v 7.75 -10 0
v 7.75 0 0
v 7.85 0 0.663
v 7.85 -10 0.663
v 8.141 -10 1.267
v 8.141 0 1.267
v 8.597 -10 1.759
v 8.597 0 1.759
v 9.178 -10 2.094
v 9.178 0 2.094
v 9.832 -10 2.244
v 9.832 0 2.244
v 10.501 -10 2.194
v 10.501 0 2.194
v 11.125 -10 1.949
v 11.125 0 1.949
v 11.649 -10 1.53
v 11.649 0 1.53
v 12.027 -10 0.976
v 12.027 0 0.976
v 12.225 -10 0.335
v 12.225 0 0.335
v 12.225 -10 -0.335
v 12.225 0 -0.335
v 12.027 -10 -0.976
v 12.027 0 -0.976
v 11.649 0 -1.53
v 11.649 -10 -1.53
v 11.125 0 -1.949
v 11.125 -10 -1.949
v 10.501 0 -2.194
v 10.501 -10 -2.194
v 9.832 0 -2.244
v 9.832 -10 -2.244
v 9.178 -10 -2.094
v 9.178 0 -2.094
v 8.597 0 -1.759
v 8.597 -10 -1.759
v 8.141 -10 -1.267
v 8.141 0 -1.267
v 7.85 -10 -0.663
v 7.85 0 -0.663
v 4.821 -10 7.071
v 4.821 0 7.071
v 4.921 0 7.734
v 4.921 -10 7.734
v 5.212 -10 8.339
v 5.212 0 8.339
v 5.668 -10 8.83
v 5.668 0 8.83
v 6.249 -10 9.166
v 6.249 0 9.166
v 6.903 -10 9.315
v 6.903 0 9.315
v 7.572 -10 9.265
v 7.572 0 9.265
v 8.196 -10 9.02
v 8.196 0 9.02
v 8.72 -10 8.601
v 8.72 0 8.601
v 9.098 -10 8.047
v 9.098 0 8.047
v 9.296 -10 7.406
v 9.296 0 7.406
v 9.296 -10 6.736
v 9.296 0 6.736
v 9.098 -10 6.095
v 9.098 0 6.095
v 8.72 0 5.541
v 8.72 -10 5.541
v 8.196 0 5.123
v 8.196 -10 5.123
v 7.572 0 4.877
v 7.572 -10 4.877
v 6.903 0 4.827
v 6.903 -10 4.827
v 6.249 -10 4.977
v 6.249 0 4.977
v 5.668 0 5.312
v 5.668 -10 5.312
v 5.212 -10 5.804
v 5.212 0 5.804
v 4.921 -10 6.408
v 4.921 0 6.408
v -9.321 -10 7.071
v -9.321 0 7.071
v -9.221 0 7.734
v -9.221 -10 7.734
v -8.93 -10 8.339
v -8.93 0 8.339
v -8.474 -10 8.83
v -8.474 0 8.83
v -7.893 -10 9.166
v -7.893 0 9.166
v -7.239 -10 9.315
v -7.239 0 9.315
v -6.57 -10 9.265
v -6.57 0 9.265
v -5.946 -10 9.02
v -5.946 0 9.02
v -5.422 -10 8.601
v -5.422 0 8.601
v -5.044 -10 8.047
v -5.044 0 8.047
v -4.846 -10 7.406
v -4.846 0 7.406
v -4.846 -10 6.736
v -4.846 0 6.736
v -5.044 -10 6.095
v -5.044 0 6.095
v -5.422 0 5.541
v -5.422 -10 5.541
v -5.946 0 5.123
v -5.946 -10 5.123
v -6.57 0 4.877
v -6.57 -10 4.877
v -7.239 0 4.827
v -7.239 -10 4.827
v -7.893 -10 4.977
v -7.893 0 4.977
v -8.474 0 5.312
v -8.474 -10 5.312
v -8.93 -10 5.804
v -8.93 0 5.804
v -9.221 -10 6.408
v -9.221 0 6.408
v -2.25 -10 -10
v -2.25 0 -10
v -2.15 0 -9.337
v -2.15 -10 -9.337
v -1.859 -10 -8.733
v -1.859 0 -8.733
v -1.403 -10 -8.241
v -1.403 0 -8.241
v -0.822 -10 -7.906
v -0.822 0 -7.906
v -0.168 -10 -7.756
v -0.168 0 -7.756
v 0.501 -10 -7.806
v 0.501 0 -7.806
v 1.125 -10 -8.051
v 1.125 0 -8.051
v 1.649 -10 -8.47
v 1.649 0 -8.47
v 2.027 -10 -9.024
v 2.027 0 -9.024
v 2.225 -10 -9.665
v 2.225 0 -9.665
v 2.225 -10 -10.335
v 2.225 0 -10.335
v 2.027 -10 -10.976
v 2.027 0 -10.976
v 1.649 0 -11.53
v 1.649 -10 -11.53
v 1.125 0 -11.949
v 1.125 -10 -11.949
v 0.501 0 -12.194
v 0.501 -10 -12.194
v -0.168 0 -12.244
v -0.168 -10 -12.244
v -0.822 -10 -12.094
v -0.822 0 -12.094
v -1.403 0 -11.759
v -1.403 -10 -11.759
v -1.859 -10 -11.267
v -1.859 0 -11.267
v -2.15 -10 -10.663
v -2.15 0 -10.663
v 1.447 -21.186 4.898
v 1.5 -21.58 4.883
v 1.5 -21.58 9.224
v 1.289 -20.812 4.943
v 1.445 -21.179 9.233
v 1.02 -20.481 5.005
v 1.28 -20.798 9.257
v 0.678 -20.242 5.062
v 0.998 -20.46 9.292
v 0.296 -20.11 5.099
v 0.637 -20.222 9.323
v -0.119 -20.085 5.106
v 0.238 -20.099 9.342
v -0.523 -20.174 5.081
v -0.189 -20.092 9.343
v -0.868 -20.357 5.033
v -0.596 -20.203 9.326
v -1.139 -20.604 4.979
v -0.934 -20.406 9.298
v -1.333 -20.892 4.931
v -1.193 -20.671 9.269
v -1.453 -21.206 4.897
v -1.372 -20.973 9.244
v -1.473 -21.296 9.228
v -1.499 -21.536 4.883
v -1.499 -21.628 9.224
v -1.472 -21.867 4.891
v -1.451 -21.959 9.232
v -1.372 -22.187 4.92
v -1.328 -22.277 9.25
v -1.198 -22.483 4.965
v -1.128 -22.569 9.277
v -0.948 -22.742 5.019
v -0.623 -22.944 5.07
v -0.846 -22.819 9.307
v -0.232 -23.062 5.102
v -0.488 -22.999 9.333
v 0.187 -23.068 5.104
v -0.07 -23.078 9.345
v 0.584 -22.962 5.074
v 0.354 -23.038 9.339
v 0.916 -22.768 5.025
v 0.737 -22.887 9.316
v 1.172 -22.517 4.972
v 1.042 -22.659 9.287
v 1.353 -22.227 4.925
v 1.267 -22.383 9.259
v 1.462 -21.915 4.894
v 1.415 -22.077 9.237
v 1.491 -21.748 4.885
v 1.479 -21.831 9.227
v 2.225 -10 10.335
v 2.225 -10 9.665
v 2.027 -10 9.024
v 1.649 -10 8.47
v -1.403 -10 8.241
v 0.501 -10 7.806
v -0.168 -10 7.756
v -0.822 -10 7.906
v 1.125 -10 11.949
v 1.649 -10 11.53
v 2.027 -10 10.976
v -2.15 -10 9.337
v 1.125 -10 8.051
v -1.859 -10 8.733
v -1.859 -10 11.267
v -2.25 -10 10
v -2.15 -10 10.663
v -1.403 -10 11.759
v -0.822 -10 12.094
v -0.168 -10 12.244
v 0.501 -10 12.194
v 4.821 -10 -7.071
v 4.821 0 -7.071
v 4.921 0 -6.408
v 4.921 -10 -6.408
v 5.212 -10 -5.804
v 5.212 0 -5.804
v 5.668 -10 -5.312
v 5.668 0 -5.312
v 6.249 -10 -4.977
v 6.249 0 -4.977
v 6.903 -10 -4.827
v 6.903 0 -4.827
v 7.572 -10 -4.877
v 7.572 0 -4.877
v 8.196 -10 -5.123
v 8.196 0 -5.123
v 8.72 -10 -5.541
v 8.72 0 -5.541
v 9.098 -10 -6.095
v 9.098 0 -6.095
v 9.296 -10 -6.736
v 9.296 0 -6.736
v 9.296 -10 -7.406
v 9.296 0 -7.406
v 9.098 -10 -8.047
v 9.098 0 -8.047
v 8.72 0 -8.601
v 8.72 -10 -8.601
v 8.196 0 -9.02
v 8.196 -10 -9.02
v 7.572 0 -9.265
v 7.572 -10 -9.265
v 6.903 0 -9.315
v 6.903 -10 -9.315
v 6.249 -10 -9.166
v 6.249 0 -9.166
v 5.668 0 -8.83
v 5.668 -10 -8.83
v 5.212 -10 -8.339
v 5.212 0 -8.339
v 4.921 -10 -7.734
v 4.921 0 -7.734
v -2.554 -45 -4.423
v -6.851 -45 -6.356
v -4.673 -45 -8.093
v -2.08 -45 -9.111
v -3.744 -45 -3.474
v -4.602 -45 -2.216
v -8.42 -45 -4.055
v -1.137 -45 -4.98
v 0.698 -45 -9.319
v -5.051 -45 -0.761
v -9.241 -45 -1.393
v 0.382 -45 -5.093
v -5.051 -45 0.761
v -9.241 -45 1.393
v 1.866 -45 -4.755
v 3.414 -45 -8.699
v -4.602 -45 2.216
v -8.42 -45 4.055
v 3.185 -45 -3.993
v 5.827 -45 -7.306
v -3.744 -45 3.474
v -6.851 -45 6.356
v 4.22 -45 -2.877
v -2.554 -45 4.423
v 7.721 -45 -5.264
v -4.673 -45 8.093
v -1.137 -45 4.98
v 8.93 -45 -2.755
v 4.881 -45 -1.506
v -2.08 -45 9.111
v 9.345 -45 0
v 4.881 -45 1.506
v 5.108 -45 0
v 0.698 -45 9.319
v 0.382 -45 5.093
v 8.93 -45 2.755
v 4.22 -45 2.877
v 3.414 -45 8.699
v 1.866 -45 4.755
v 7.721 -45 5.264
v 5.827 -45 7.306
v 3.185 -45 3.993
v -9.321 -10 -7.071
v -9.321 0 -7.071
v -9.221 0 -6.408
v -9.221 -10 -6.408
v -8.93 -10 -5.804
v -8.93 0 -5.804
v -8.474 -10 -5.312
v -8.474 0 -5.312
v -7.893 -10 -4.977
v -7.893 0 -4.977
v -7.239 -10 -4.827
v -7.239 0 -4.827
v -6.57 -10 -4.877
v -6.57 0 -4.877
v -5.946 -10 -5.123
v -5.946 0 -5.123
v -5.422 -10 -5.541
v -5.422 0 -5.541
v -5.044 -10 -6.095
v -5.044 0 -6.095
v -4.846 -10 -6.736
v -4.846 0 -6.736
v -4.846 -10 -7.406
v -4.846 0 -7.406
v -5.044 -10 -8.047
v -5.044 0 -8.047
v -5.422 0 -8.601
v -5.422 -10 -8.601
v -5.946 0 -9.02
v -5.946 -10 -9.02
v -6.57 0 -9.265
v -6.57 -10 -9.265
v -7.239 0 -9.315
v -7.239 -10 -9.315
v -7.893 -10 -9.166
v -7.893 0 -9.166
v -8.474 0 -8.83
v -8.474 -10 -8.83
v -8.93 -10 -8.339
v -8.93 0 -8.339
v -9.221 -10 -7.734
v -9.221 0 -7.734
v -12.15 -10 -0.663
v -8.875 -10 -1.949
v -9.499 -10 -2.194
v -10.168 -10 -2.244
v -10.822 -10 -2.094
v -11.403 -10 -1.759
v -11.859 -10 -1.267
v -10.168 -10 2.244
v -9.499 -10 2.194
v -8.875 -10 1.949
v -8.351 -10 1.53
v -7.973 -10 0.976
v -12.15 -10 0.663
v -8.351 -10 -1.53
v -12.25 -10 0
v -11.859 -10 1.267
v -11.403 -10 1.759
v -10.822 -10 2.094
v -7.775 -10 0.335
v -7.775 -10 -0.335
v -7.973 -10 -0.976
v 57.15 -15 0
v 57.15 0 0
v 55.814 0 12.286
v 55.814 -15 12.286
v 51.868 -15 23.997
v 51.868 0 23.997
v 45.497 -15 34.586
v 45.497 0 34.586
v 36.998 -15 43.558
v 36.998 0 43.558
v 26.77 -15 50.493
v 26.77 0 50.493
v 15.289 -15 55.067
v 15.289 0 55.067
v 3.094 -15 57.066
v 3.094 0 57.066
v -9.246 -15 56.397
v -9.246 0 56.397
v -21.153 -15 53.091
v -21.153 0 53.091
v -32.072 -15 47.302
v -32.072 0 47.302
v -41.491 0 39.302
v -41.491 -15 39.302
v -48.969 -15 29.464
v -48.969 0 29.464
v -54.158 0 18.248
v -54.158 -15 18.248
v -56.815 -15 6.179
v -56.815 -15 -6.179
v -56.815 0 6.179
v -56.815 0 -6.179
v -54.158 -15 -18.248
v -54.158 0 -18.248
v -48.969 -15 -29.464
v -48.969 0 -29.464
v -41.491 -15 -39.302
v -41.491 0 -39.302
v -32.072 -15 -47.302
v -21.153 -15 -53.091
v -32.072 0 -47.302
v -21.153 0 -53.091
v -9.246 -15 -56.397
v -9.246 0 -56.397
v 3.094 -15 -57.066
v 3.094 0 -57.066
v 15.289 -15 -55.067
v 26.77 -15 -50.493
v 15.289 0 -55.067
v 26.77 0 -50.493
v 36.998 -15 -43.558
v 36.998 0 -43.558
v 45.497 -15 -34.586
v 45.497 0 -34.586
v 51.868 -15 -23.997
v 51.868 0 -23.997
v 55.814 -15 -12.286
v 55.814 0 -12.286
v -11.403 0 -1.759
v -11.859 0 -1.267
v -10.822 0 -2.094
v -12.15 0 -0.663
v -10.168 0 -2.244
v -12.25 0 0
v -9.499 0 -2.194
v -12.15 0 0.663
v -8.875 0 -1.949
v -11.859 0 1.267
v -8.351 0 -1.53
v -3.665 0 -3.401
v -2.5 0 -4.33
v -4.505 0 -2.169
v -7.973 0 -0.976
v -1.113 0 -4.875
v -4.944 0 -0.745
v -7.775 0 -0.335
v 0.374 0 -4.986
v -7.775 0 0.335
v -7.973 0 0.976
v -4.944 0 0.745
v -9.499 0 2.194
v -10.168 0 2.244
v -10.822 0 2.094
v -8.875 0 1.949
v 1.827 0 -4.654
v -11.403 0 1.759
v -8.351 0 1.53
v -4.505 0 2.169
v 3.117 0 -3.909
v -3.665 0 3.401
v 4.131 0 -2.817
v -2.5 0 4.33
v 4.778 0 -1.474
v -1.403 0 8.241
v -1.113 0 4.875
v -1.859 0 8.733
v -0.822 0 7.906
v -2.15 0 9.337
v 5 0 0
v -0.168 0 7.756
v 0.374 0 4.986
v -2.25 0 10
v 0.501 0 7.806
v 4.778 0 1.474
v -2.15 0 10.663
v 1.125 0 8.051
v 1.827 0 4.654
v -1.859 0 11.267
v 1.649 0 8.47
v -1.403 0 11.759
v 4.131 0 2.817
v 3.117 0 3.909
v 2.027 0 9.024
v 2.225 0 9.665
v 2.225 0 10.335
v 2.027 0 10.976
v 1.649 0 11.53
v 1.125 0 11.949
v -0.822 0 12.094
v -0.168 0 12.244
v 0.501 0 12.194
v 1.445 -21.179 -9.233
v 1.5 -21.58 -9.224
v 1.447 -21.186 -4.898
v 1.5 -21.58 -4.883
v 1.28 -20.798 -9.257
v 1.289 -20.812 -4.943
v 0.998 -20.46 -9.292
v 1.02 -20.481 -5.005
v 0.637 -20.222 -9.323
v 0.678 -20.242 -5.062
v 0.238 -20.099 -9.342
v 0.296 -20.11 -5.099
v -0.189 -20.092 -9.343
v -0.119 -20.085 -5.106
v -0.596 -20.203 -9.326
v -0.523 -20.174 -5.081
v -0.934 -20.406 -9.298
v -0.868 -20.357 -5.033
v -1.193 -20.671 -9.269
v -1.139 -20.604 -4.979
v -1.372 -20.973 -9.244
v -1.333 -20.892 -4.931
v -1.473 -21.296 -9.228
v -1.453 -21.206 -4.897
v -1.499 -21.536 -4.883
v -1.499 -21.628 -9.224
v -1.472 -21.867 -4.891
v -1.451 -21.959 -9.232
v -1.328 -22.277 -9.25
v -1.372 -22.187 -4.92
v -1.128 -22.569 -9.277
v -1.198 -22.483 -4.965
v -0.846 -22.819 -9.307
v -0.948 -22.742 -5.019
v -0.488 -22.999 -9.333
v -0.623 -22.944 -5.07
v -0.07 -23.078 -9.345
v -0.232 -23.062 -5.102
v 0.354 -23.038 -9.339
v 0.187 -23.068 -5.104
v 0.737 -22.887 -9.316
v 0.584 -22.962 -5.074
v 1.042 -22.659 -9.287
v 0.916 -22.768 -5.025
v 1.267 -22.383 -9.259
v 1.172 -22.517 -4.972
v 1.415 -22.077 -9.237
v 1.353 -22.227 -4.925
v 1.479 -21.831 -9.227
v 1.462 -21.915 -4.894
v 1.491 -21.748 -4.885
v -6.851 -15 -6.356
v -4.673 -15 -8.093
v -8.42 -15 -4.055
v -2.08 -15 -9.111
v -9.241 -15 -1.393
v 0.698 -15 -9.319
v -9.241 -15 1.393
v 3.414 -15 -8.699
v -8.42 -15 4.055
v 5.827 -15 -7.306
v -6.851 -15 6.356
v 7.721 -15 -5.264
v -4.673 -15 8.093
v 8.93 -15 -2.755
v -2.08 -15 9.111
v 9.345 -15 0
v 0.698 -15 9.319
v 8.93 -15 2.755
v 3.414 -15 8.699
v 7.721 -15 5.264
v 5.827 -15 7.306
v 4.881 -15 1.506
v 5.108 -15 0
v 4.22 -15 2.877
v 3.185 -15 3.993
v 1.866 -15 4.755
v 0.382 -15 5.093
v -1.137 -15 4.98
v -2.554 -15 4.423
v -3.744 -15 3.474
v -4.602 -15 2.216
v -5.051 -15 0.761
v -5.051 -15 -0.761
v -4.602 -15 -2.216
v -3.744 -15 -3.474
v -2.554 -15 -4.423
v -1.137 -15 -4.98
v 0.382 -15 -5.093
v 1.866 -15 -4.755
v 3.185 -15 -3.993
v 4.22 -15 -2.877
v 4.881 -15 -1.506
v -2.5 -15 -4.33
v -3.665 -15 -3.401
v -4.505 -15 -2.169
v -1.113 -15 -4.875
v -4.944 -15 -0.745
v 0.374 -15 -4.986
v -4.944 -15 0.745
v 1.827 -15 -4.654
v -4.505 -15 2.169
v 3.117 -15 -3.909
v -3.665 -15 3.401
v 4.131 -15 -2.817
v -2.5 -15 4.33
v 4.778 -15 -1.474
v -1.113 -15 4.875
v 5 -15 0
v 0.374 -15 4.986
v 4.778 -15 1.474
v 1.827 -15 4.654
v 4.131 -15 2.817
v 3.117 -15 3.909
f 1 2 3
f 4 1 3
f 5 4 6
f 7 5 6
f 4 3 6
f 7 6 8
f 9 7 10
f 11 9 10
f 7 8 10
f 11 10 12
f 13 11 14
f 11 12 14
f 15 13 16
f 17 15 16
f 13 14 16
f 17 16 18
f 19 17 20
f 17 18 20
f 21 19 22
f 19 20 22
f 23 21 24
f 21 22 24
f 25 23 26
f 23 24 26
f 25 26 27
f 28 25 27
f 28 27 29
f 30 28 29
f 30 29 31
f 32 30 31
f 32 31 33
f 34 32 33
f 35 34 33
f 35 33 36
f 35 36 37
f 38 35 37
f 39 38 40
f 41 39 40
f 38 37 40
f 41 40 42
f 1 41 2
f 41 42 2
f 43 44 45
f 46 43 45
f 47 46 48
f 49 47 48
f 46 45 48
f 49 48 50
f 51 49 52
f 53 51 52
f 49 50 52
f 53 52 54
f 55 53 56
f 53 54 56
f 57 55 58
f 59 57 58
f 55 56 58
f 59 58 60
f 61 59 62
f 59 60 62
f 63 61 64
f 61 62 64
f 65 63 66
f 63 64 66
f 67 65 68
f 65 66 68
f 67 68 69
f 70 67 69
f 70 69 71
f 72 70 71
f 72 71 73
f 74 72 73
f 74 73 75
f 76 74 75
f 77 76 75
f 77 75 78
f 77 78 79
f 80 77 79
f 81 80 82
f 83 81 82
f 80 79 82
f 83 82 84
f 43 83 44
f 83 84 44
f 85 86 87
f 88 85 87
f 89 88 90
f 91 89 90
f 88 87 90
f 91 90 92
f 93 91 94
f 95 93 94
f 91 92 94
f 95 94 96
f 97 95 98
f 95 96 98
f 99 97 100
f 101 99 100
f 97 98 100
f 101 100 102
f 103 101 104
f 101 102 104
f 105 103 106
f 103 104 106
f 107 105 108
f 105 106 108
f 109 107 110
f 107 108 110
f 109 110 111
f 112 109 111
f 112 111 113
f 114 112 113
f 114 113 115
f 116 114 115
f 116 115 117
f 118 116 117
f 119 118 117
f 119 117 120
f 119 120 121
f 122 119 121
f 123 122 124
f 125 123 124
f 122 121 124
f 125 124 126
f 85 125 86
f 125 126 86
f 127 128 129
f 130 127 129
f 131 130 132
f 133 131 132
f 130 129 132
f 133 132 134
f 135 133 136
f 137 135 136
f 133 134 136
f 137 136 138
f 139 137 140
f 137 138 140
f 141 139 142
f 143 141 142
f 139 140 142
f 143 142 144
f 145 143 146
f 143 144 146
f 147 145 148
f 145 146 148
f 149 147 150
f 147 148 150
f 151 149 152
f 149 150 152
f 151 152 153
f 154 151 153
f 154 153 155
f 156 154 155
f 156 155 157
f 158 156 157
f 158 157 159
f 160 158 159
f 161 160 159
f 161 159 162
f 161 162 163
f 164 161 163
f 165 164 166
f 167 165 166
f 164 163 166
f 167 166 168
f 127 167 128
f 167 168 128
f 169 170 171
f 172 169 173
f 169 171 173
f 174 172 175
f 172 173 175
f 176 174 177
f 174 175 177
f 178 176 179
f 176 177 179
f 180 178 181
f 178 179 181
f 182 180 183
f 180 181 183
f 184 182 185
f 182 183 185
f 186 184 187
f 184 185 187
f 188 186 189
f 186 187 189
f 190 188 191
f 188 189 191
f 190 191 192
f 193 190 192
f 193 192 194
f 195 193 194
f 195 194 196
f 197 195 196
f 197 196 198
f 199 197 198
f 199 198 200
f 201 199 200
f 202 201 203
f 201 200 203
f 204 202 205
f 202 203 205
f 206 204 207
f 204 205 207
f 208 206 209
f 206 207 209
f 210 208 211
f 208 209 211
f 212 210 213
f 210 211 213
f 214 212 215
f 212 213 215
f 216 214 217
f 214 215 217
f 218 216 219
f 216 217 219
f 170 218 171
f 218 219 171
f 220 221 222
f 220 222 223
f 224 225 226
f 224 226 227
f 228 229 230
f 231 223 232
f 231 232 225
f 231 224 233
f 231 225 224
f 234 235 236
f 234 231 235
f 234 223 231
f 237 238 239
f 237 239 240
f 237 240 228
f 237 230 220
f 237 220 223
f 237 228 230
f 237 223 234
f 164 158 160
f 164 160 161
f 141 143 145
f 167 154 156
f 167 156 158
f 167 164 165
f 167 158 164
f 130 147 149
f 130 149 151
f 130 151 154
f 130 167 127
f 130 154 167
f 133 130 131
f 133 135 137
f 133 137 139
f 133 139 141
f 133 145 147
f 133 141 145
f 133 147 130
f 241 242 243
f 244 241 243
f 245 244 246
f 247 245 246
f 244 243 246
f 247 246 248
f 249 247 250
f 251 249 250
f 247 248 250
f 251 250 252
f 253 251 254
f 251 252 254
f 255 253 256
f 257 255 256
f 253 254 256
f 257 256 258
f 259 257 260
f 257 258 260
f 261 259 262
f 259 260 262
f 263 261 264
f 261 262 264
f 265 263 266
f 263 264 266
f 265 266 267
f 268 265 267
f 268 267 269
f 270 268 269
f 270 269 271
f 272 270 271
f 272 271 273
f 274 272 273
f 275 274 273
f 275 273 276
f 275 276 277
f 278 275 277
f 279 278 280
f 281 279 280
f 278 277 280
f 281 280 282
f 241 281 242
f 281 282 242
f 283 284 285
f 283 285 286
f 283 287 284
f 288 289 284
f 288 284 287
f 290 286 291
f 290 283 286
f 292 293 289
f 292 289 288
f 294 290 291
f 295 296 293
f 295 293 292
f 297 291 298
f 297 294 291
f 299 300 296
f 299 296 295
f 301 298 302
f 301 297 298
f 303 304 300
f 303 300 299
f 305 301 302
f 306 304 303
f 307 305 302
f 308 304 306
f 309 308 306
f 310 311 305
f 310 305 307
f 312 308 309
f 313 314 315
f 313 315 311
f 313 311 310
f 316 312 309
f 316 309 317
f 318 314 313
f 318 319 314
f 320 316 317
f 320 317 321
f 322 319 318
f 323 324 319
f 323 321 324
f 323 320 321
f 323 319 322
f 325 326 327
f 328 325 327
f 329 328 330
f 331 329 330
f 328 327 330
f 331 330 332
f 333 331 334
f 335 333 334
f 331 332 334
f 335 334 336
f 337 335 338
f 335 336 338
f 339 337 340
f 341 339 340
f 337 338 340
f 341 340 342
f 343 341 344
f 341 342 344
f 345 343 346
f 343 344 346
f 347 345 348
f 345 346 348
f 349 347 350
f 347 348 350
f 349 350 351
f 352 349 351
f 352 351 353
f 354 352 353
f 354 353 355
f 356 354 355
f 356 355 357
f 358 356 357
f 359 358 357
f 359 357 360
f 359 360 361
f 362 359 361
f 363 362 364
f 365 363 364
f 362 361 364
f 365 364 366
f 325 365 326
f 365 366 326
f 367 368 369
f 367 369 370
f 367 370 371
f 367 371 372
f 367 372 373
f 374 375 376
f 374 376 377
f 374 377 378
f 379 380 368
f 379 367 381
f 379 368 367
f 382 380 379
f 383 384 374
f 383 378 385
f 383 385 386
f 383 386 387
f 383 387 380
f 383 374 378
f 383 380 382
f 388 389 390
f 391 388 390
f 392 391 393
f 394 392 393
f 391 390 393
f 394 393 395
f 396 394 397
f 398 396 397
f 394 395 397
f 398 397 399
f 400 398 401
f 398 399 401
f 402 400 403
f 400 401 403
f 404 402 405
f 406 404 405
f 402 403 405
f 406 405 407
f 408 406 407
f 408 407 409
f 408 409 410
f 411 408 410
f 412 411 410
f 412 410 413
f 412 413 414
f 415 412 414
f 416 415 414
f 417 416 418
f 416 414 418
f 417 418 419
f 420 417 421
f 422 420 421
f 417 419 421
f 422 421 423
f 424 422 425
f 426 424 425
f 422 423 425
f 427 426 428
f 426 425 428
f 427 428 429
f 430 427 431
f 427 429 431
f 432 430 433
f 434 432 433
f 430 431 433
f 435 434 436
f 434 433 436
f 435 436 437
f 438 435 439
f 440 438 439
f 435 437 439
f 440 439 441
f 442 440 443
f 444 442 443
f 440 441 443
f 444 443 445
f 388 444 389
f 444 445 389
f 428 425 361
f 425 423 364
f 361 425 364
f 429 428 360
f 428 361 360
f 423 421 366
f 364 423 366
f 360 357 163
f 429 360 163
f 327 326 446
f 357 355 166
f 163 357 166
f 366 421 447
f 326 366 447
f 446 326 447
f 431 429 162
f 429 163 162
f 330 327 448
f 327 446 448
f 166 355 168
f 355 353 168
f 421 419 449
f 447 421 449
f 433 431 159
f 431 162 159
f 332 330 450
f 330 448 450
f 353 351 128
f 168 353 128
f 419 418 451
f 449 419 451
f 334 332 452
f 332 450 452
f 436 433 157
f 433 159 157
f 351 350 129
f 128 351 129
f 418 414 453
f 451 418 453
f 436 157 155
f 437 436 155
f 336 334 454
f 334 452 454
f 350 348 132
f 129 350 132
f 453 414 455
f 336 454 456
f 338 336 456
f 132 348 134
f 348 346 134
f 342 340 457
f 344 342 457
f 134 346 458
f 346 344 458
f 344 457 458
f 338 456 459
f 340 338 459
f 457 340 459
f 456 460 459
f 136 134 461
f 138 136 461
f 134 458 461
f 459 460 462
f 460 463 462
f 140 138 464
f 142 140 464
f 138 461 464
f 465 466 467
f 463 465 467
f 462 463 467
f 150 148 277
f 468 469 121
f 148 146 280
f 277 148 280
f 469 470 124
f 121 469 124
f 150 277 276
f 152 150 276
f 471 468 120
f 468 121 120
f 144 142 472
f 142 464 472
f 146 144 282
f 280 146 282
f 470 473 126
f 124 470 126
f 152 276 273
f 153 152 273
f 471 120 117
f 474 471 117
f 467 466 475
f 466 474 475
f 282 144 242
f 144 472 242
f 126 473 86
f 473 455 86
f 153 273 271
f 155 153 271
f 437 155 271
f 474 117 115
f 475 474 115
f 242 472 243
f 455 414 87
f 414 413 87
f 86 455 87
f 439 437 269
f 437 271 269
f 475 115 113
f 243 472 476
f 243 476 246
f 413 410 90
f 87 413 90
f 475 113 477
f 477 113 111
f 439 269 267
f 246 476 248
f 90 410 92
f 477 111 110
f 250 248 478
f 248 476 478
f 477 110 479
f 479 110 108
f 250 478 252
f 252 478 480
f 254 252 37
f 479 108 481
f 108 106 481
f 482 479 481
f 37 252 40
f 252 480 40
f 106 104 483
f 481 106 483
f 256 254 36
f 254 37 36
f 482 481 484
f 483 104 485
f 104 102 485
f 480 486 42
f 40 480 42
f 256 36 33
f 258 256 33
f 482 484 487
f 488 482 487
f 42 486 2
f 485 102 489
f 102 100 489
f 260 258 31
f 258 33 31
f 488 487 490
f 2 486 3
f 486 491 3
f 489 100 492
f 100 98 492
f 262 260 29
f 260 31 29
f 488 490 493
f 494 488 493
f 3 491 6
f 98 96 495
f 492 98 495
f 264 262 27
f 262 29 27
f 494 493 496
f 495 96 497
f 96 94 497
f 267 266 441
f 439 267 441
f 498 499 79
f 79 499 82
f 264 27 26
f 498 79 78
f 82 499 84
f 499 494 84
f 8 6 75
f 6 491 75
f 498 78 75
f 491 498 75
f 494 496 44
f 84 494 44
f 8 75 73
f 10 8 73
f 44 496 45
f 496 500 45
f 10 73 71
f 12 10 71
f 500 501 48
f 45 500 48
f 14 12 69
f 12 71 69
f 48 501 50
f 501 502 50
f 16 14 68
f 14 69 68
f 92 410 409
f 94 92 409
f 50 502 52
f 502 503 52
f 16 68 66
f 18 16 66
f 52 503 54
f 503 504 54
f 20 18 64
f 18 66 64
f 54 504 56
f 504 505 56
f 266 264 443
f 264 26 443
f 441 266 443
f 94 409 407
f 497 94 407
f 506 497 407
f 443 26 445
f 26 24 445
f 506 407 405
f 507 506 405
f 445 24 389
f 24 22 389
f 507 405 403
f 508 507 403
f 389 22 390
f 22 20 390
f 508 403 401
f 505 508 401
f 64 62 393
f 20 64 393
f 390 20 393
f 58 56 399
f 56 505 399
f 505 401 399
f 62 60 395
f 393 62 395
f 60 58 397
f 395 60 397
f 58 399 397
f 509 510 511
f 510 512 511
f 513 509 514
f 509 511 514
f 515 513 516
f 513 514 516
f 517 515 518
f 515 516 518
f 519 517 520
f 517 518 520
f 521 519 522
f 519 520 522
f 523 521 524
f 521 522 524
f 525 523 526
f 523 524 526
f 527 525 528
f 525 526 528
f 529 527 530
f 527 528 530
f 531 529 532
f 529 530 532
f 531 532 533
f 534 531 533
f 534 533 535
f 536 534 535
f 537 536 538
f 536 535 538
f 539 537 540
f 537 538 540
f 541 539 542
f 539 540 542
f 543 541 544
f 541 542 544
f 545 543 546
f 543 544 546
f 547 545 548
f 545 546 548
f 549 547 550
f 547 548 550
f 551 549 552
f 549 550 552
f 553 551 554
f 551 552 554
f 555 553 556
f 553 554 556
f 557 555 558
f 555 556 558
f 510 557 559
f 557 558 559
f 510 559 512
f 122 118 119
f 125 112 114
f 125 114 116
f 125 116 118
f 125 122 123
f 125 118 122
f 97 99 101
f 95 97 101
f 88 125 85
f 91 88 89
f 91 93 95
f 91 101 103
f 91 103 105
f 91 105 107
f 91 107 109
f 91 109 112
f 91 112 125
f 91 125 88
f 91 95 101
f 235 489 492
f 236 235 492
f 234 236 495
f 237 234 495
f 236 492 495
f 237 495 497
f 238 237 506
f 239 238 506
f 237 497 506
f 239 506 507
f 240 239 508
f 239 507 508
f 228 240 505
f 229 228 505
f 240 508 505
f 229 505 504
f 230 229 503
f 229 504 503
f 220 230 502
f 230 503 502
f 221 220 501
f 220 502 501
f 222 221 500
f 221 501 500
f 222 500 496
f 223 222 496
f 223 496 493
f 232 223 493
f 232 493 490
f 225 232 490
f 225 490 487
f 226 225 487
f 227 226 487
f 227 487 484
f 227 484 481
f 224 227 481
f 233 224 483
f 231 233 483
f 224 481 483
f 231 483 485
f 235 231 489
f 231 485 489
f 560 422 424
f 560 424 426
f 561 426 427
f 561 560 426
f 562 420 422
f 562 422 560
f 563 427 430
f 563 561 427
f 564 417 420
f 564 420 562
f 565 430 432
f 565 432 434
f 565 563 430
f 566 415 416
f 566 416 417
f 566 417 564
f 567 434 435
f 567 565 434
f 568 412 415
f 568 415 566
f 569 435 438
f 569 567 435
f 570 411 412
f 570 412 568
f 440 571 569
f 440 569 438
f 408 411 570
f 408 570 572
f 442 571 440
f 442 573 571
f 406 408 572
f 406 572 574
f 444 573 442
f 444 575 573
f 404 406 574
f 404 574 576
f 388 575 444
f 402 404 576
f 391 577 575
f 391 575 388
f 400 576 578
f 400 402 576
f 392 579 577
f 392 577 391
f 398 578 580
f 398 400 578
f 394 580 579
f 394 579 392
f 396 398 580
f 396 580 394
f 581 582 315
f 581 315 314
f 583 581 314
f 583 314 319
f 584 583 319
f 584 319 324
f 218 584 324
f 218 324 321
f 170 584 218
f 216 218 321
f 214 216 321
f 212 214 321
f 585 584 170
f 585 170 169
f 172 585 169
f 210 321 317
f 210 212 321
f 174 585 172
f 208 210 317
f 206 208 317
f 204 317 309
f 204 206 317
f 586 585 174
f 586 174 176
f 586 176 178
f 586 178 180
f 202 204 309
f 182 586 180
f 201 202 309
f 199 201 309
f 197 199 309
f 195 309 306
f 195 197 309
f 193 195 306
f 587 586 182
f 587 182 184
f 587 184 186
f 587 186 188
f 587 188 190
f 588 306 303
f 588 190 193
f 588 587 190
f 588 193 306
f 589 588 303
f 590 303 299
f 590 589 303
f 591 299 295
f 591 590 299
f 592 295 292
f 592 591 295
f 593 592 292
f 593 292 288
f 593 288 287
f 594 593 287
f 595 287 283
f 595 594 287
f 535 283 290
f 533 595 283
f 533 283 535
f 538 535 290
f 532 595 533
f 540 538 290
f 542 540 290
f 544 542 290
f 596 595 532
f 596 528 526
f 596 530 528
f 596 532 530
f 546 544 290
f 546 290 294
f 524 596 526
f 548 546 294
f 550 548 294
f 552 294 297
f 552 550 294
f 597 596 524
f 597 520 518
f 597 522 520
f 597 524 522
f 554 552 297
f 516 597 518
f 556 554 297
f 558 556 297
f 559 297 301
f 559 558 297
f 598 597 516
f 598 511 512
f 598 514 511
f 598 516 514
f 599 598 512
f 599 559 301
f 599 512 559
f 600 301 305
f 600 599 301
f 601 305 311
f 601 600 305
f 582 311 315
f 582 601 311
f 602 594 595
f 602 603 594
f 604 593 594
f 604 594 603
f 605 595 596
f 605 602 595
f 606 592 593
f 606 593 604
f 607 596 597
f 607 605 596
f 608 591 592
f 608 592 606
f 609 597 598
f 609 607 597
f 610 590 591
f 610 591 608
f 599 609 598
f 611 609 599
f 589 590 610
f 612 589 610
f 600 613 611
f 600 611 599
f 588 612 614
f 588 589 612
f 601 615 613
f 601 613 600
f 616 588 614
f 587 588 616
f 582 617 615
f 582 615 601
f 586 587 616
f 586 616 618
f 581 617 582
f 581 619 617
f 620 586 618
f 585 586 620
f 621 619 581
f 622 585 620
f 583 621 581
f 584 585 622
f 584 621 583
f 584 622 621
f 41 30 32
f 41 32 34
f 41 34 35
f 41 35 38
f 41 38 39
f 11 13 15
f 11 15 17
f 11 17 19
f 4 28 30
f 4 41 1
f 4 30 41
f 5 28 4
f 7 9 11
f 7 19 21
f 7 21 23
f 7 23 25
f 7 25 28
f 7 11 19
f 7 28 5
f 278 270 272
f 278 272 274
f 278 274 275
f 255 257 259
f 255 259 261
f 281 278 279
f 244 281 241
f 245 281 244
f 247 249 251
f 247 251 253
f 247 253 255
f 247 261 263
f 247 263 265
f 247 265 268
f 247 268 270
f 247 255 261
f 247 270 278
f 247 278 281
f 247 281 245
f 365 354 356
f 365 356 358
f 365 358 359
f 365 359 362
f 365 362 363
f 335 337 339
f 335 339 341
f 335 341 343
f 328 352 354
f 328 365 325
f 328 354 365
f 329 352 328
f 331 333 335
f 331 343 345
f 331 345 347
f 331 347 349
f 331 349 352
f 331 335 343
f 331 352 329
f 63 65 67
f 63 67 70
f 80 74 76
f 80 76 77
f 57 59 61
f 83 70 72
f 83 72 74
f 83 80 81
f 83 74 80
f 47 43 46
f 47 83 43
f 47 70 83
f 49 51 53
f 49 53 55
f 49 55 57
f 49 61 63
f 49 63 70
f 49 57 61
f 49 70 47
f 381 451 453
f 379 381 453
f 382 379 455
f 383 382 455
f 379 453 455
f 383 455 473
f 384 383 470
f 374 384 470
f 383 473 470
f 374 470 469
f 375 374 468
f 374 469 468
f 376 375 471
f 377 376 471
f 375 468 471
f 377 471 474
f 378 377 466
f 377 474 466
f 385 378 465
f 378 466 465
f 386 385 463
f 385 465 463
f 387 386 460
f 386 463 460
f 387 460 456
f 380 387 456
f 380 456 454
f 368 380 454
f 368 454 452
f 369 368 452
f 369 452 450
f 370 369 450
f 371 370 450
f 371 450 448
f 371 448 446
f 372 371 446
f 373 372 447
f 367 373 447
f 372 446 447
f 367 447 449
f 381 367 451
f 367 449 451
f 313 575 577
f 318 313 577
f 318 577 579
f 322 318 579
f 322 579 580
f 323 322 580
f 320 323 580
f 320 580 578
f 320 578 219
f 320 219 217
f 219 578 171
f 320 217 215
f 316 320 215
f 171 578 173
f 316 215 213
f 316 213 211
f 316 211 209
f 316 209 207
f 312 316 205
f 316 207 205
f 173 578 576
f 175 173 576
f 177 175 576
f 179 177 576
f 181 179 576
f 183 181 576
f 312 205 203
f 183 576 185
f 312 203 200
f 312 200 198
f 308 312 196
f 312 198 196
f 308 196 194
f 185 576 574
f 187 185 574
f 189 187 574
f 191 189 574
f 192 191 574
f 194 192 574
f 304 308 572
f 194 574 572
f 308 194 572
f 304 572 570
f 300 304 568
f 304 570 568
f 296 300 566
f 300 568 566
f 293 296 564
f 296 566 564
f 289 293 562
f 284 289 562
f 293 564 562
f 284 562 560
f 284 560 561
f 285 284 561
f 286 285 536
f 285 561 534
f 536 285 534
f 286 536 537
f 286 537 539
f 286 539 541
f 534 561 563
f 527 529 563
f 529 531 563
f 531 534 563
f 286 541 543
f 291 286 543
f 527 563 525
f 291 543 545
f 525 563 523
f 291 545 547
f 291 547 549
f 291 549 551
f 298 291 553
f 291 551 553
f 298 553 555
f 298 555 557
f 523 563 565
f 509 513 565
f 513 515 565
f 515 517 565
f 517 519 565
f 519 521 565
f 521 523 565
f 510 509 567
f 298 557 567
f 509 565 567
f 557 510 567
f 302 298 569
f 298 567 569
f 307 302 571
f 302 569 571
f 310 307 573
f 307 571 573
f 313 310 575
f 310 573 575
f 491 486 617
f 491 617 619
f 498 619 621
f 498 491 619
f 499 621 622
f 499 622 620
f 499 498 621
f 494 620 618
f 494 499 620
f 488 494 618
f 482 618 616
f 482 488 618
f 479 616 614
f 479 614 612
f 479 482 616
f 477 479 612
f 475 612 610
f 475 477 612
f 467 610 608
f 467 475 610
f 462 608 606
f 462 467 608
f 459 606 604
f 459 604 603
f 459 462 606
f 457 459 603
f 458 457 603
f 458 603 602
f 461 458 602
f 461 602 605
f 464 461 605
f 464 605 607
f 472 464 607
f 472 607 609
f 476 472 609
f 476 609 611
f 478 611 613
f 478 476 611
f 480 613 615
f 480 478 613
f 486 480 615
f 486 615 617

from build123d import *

# Parameters (mm, degrees)
F0_R     = 57.15
F0_R_2   = 5
F1_DEPTH = 15
F2_R     = 9.345245
F2_R_2   = 5.107746
F3_DEPTH = 30
F4_R     = 1.5
F5_DEPTH = 12.7
F6_R     = 2.25
F7_DEPTH = 10


with BuildPart() as f1:
    # F0 (on Front) → F1 (new body)
    with BuildSketch(Plane.XZ):
        Circle(F0_R)
        Circle(F0_R_2, mode=Mode.SUBTRACT)
    extrude(amount=F1_DEPTH)

    # F2 (on face) → F3 (join)
    with BuildSketch(Plane.XZ.offset(15)):
        Circle(F2_R)
        Circle(F2_R_2, mode=Mode.SUBTRACT)
    extrude(amount=F3_DEPTH)

    # F4 (on Top) → F5 (cut, symmetric)
    with BuildSketch(Plane.XY):
        with Locations((0, -21.58)):
            Circle(F4_R)
    extrude(amount=F5_DEPTH, both=True, mode=Mode.SUBTRACT)

    # F6 (on face) → F7 (cut)
    with BuildSketch(Plane(origin=(0, 0, 0), x_dir=(-1, 0, 0), z_dir=(0, 1, 0))):
        with Locations((0, 10)):
            Circle(F6_R)
        with Locations((7.071068, 7.071068)):
            Circle(F6_R)
        with Locations((10, 0)):
            Circle(F6_R)
        with Locations((0, -10)):
            Circle(F6_R)
        with Locations((7.071068, -7.071068)):
            Circle(F6_R)
        with Locations((-7.071068, -7.071068)):
            Circle(F6_R)
        with Locations((-10, 0)):
            Circle(F6_R)
        with Locations((-7.071068, 7.071068)):
            Circle(F6_R)
    extrude(amount=-F7_DEPTH, mode=Mode.SUBTRACT)


solid = f1.part
